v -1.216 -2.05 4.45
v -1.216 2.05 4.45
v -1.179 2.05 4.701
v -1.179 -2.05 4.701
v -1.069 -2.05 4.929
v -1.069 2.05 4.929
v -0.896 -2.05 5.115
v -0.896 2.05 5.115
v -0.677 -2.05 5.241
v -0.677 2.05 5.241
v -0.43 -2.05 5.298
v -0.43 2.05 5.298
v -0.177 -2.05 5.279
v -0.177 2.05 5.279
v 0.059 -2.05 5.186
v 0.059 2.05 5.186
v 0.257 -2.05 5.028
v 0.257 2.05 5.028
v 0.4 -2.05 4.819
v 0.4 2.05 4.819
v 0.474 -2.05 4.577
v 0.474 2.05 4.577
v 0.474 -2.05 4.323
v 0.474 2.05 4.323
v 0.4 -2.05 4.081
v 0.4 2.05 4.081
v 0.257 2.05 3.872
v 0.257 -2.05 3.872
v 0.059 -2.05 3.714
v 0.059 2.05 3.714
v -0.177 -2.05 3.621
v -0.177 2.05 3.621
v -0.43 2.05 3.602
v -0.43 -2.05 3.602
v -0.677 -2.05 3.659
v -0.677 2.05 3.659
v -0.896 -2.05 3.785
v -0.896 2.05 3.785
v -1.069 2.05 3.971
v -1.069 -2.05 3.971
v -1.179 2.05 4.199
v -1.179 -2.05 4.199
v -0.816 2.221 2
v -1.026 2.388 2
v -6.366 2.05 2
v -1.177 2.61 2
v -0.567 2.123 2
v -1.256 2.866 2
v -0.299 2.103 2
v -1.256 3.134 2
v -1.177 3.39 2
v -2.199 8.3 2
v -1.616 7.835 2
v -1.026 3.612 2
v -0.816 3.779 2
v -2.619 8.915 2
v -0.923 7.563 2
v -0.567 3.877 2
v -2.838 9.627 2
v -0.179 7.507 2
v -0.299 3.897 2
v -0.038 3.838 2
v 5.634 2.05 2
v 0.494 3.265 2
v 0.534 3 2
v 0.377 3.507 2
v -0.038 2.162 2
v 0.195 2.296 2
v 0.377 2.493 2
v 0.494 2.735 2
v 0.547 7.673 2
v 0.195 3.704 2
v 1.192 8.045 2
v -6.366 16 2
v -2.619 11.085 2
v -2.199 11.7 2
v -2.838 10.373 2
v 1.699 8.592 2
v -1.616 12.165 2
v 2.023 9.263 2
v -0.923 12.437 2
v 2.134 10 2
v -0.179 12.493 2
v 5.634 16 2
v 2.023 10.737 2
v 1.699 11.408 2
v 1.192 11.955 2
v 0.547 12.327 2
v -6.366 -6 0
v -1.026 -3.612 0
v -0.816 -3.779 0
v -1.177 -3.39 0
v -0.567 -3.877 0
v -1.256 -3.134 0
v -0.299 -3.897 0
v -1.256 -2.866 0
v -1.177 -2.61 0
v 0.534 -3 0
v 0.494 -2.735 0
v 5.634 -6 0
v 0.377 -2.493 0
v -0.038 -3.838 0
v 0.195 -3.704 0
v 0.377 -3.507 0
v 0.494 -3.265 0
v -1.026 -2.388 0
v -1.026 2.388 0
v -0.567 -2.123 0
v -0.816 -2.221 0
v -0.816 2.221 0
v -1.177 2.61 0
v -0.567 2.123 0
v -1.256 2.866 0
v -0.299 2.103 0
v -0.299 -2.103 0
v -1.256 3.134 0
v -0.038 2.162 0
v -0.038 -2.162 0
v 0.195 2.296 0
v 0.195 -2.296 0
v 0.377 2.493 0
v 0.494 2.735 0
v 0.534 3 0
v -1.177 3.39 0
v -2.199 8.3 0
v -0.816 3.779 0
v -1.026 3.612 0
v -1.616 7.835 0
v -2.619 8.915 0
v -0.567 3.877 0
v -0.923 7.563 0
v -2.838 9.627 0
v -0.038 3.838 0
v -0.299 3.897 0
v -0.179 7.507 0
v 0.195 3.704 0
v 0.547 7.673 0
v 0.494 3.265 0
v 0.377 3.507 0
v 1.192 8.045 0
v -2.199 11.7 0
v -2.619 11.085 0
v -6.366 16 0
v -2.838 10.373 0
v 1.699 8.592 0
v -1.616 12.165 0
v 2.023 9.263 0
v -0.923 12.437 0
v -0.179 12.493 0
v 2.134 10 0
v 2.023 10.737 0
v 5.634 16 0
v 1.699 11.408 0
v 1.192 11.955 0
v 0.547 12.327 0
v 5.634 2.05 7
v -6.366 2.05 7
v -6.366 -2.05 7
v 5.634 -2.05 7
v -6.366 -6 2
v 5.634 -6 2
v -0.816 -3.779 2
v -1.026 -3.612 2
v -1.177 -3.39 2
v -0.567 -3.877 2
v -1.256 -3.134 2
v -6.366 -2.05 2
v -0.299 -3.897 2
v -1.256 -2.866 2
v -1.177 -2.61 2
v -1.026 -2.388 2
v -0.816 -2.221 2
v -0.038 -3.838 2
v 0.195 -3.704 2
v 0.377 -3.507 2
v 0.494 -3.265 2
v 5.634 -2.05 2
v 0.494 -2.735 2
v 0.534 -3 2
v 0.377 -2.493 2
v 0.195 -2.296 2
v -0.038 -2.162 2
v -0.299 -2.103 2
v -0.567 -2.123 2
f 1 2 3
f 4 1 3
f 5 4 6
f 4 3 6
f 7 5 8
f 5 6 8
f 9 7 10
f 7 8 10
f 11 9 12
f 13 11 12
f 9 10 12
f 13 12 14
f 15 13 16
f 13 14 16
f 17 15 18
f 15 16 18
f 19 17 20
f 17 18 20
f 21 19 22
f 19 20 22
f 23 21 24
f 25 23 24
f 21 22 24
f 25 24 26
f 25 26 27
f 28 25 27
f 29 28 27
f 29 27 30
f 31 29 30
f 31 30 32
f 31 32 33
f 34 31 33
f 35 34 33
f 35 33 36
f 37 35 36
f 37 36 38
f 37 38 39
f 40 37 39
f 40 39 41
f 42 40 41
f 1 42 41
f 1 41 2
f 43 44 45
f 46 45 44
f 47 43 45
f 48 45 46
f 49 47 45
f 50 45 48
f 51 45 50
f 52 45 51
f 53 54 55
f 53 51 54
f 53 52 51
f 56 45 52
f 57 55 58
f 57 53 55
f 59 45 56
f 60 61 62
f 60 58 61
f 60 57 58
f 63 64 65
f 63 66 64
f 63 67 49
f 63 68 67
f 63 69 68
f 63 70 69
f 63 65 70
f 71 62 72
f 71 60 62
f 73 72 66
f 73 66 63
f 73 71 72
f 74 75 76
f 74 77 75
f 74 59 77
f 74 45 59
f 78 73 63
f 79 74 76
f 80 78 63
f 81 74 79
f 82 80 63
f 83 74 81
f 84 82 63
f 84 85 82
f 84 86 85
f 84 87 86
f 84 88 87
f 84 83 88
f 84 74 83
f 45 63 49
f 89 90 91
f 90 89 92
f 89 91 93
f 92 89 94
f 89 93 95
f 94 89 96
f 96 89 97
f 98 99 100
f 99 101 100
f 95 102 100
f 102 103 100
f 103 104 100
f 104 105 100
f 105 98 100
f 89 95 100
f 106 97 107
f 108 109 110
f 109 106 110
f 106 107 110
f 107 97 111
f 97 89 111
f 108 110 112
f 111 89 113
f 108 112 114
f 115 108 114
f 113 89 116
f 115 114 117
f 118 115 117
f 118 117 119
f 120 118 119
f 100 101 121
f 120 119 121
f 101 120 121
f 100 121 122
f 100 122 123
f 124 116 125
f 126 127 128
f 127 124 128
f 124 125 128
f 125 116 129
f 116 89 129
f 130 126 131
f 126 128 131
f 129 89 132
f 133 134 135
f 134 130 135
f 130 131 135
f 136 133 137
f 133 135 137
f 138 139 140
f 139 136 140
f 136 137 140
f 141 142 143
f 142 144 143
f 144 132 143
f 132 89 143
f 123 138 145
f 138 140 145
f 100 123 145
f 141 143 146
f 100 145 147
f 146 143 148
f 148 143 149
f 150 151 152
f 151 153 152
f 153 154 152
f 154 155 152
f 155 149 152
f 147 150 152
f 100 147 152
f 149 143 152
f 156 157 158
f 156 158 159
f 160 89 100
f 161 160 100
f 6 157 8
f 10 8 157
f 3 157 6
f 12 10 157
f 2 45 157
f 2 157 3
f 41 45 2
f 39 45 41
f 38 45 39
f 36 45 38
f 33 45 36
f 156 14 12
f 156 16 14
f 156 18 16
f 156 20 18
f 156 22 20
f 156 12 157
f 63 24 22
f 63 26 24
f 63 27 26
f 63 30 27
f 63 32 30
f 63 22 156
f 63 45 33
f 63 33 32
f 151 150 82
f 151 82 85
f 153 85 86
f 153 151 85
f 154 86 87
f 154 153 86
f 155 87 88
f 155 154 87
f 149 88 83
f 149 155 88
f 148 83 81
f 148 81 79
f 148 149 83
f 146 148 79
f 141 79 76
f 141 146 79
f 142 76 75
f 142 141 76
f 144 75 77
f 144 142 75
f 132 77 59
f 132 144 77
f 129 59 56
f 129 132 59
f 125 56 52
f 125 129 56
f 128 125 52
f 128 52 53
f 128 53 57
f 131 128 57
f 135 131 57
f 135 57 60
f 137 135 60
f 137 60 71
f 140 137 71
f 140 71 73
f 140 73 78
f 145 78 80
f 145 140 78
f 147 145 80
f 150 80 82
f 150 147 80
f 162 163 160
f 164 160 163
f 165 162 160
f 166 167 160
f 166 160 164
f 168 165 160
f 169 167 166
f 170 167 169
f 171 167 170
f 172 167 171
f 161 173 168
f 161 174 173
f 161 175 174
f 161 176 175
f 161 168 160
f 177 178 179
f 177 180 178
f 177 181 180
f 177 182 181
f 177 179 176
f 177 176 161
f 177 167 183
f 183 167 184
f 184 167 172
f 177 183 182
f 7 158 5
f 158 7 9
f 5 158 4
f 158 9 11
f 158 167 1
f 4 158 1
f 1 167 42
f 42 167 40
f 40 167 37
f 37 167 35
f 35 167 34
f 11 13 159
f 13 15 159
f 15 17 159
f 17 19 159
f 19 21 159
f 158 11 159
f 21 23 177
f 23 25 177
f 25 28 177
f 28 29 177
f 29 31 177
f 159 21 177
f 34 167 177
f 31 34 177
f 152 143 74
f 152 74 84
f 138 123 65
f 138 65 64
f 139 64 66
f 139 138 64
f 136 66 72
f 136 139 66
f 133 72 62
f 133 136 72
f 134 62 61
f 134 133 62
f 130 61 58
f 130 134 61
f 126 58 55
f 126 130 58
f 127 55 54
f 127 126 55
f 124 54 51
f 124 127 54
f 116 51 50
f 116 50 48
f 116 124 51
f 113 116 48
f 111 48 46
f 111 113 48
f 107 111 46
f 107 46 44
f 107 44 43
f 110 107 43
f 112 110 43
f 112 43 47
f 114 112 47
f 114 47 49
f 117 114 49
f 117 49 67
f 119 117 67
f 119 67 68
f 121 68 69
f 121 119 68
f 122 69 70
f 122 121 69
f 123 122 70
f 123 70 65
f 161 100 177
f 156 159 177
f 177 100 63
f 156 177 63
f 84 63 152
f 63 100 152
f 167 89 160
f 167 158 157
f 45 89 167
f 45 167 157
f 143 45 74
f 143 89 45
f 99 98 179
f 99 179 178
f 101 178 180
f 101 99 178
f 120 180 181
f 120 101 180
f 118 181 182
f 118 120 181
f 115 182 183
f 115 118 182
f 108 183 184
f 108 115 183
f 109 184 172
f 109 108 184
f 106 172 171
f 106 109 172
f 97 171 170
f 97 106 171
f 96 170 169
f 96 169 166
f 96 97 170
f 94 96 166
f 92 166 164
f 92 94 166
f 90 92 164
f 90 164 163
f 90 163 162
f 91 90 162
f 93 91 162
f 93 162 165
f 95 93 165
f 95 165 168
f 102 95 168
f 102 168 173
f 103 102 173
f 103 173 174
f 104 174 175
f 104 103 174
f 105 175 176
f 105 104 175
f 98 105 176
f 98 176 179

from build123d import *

# Parameters (mm, degrees)
F0_W     = 12
F0_H     = 4.1
F1_DEPTH = 7
F0_H_2   = 13.95
F0_R     = 0.9
F0_R_2   = 4
F0_H_3   = 3.95
F0_R_3   = 2.5
F2_DEPTH = 2
F4_R     = 0.85
F5_DEPTH = 5


# Not quite as in the source:
# - a feature of the source that left no trace in its solid (it failed there, or was rolled back) is left out


with BuildPart() as f1:
    # F0 (on Top) → F1 (new body)
    with BuildSketch(Plane.XY):
        with Locations((-0.3663106412, 0)):
            Rectangle(F0_W, F0_H)
    extrude(amount=F1_DEPTH)

    # F0 (on Top) → F2 (join)
    with BuildSketch(Plane.XY):
        with Locations((-0.3663106412, 9.025)):
            Rectangle(F0_W, F0_H_2)
        with Locations((-0.3663106412, 3)):
            Circle(F0_R, mode=Mode.SUBTRACT)
        with Locations((-0.3663106412, 10)):
            Circle(F0_R_2, mode=Mode.SUBTRACT)
        with Locations((-0.3663106412, -4.025)):
            Rectangle(F0_W, F0_H_3)
        with Locations((-0.3663106412, -3)):
            Circle(F0_R, mode=Mode.SUBTRACT)
        with Locations((-0.3663106412, 10)):
            Circle(F0_R_2)
        with Locations((-0.3663106412, 10)):
            Circle(F0_R_3, mode=Mode.SUBTRACT)
    extrude(amount=F2_DEPTH)

    # F4 (on face) → F5 (cut)
    with BuildSketch(Plane(origin=(0, 2.05, 0), x_dir=(-1, 0, 0), z_dir=(0, 1, 0))):
        with Locations((0.3663106412, 4.45)):
            Circle(F4_R)
    extrude(amount=-F5_DEPTH, mode=Mode.SUBTRACT)


solid = f1.part
